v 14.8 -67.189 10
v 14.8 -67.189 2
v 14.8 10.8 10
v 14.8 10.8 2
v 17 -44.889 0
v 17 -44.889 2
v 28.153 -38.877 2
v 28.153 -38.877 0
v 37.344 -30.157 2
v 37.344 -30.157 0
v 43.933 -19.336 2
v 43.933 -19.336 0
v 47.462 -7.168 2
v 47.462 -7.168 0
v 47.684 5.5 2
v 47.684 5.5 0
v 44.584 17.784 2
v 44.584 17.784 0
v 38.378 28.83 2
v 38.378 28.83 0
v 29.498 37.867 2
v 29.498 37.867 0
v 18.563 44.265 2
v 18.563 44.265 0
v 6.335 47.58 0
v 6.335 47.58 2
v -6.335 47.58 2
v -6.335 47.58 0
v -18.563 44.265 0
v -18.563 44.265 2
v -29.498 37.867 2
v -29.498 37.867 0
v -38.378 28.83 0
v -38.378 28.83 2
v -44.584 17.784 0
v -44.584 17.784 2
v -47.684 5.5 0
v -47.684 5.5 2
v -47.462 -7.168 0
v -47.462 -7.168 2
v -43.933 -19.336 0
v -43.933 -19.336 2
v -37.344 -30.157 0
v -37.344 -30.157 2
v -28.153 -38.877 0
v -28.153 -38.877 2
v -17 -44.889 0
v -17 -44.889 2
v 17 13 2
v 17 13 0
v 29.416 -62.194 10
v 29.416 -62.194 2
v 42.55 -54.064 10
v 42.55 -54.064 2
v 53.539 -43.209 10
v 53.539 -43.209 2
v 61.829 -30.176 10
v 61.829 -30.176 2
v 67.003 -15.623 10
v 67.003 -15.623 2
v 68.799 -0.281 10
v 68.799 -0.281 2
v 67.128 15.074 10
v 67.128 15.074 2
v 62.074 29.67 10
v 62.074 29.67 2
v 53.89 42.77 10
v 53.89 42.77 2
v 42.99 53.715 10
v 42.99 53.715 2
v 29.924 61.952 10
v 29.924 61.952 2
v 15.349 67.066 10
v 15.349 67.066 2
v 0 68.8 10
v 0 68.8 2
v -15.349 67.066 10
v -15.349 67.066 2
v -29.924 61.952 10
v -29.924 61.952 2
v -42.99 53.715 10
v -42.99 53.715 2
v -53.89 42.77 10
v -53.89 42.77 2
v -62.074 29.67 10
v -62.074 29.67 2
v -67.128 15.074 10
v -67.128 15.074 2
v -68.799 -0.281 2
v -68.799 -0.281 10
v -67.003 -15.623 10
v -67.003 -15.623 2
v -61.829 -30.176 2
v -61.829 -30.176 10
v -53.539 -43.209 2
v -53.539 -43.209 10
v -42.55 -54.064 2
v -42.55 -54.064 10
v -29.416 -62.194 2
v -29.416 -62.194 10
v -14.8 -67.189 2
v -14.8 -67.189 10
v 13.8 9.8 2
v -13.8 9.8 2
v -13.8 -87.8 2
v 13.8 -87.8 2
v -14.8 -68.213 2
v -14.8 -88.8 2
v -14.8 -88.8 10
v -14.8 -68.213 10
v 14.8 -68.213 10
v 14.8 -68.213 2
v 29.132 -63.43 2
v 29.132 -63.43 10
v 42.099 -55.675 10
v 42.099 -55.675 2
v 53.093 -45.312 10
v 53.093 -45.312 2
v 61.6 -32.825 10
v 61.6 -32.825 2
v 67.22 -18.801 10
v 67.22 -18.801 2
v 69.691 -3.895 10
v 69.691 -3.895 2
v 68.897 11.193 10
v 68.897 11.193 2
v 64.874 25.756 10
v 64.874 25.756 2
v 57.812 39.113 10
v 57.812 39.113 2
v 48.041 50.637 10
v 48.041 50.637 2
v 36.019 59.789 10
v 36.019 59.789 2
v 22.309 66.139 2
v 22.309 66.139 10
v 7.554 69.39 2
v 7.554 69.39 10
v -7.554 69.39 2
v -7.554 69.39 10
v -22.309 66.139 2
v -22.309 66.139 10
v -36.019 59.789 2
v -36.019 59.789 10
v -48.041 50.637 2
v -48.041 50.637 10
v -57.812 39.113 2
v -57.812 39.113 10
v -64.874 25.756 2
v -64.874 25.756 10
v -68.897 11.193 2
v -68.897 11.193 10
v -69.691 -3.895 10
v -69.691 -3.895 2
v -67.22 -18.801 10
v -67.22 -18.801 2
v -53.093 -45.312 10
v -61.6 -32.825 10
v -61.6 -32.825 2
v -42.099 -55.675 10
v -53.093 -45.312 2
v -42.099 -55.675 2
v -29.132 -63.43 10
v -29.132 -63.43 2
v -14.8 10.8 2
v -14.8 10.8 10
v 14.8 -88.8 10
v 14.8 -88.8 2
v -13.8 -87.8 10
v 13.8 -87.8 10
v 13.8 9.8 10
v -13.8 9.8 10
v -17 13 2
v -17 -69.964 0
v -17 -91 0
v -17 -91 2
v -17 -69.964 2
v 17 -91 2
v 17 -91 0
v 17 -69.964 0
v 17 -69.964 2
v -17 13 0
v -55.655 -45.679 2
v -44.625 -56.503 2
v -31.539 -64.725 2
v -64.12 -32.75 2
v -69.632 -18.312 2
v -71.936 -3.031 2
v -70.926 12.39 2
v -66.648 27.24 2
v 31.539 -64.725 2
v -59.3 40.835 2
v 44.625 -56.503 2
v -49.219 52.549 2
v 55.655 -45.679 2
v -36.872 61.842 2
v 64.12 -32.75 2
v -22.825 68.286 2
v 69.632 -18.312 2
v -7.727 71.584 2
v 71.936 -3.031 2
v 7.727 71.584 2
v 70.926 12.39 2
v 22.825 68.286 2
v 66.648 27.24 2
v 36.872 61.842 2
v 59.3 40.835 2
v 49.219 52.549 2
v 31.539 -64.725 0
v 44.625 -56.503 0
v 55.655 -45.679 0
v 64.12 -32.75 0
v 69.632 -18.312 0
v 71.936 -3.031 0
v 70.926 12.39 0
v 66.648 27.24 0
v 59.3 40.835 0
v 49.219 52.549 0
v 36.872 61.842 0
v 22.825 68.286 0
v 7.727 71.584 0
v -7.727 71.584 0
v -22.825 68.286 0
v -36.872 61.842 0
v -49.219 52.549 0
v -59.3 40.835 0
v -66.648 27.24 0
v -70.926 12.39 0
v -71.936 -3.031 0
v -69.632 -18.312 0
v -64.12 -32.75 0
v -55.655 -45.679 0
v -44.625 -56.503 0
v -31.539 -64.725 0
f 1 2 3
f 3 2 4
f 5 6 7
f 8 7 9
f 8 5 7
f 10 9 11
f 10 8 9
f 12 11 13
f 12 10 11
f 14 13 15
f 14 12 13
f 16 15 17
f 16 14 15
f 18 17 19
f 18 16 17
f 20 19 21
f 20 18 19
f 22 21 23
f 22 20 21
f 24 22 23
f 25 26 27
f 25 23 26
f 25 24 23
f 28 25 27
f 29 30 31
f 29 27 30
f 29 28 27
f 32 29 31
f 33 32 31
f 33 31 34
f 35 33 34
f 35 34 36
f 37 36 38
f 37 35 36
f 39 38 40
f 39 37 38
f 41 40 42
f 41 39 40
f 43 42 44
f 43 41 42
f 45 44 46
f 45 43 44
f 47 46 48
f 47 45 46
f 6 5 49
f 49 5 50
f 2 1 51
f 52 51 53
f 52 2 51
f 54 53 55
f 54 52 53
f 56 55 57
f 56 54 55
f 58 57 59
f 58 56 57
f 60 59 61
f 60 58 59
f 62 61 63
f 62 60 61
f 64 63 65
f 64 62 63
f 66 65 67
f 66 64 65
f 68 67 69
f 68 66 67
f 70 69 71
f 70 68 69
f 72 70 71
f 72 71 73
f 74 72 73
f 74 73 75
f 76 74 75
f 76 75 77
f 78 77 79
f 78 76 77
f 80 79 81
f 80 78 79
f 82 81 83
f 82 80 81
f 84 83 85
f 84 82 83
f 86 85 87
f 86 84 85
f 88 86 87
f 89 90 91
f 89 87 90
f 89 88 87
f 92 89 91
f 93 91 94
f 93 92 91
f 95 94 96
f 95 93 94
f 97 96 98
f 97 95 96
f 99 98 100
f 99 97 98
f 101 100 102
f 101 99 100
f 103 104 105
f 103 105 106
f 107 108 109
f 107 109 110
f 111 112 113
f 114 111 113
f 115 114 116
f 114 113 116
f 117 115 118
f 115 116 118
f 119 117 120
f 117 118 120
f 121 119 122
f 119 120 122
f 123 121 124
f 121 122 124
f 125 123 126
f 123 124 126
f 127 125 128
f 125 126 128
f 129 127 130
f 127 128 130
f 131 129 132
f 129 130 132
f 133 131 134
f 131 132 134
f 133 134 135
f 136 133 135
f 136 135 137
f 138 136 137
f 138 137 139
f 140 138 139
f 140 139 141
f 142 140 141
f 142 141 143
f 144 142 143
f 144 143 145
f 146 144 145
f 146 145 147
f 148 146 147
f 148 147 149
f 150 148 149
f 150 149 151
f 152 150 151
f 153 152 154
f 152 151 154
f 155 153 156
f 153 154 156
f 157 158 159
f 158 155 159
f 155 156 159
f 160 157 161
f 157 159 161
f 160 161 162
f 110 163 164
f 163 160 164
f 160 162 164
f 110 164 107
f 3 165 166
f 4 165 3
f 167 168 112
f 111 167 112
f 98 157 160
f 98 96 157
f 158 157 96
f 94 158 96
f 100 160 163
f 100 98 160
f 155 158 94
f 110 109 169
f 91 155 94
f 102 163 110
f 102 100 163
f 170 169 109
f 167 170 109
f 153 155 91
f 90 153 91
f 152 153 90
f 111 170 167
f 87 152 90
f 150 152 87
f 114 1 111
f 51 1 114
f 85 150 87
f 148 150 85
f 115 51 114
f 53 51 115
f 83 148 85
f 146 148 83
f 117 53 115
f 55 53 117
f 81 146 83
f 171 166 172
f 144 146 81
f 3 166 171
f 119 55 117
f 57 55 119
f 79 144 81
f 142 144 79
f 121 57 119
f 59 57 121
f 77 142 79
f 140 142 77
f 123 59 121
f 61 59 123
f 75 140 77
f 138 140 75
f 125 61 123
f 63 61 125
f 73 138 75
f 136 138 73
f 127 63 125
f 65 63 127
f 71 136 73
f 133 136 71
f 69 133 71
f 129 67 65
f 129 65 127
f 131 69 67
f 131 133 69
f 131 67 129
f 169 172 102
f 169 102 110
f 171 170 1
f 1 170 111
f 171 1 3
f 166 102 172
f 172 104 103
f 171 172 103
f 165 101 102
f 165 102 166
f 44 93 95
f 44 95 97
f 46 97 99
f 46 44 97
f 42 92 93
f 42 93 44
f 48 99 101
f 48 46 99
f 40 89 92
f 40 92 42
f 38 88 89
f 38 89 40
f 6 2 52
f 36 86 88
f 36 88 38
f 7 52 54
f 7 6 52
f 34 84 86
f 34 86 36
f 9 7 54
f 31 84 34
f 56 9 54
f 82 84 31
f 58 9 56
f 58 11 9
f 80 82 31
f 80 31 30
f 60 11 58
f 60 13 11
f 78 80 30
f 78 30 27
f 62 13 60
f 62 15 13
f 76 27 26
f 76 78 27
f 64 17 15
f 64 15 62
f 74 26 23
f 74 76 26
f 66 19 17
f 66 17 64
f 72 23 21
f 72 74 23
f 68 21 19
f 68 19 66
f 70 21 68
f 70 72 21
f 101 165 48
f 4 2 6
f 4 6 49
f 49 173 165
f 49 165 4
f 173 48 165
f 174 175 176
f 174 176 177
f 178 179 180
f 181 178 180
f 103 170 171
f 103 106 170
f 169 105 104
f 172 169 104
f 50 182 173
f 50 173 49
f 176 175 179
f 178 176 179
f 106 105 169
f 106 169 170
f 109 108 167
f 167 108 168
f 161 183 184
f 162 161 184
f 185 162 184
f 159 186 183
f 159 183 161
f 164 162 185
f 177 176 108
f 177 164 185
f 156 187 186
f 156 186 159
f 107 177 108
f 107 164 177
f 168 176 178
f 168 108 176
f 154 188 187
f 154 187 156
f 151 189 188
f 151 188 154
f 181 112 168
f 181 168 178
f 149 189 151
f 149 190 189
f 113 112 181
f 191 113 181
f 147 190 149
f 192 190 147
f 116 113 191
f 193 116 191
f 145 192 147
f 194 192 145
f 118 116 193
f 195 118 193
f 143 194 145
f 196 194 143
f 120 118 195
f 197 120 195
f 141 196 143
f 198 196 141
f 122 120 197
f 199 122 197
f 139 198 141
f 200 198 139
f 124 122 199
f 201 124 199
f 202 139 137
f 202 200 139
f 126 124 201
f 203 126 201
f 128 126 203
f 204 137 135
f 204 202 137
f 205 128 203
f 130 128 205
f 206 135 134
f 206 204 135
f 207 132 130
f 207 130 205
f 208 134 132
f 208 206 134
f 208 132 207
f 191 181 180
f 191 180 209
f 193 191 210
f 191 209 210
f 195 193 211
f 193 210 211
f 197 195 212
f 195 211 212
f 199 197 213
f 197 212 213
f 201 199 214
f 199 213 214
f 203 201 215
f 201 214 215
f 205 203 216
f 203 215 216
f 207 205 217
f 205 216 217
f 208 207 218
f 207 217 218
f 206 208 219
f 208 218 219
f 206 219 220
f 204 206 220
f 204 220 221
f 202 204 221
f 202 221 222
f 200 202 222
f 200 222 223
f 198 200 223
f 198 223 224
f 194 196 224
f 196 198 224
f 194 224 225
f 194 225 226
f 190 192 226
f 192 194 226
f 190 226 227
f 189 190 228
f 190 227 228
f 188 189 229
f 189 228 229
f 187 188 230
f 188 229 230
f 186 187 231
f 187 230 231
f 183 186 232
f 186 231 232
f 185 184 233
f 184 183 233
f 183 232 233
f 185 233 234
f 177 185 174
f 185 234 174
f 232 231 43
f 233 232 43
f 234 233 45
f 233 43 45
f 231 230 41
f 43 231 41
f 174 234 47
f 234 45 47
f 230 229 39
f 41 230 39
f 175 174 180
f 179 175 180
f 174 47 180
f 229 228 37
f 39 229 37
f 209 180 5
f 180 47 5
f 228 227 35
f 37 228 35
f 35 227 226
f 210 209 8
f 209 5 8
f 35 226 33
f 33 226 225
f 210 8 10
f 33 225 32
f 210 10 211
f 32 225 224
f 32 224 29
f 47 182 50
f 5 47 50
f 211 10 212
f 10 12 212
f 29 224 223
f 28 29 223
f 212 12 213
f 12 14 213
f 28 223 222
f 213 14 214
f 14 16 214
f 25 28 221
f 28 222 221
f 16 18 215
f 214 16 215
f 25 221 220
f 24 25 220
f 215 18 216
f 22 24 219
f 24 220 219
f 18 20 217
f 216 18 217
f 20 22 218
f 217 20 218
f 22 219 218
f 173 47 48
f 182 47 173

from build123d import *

# Parameters (mm, degrees)
F0_R      = 69.8
F0_R_2    = 68.8
F1_DEPTH  = 10
F2_W      = 29.6
F2_H      = 99.6
F2_W_2    = 27.6
F2_H_2    = 97.6
F3_DEPTH  = 10
F4_R      = 68.8
F4_R_2    = 48
F5_DEPTH  = 2
F6_R      = 72
F6_R_2    = 69.8
F7_DEPTH  = 2
F8_W      = 34
F8_H      = 104
F8_W_2    = 29.6
F8_H_2    = 99.6
F9_DEPTH  = 2
F10_W     = 27.6
F10_H     = 97.6
F11_DEPTH = 2
F12_W     = 27.6
F12_H     = 8
F13_DEPTH = 70


with BuildPart() as f1:
    # F0 (on Top) → F1 (new body)
    with BuildSketch(Plane.XY):
        Circle(F0_R)
        Circle(F0_R_2, mode=Mode.SUBTRACT)
    extrude(amount=F1_DEPTH)

    # F2 (on Top) → F3 (join)
    with BuildSketch(Plane.XY):
        with Locations((0, -39)):
            Rectangle(F2_W, F2_H)
        with Locations((0, -39)):
            Rectangle(F2_W_2, F2_H_2, mode=Mode.SUBTRACT)
    extrude(amount=F3_DEPTH)

    # F4 (on Top) → F5 (join)
    with BuildSketch(Plane.XY):
        Circle(F4_R)
        Circle(F4_R_2, mode=Mode.SUBTRACT)
    extrude(amount=F5_DEPTH)

    # F6 (on Top) → F7 (join)
    with BuildSketch(Plane.XY):
        Circle(F6_R)
        Circle(F6_R_2, mode=Mode.SUBTRACT)
    extrude(amount=F7_DEPTH)

    # F8 (on Top) → F9 (join)
    with BuildSketch(Plane.XY):
        with Locations((0, -39)):
            Rectangle(F8_W, F8_H)
        with Locations((0, -39)):
            Rectangle(F8_W_2, F8_H_2, mode=Mode.SUBTRACT)
    extrude(amount=F9_DEPTH)

    # F10 (on Top) → F11 (join)
    with BuildSketch(Plane.XY):
        with Locations((0, -39)):
            Rectangle(F10_W, F10_H)
    extrude(amount=F11_DEPTH)

    # F12 (on Front) → F13 (cut)
    with BuildSketch(Plane.XZ):
        with Locations((0, 6)):
            Rectangle(F12_W, F12_H)
    extrude(amount=F13_DEPTH, mode=Mode.SUBTRACT)


solid = f1.part
